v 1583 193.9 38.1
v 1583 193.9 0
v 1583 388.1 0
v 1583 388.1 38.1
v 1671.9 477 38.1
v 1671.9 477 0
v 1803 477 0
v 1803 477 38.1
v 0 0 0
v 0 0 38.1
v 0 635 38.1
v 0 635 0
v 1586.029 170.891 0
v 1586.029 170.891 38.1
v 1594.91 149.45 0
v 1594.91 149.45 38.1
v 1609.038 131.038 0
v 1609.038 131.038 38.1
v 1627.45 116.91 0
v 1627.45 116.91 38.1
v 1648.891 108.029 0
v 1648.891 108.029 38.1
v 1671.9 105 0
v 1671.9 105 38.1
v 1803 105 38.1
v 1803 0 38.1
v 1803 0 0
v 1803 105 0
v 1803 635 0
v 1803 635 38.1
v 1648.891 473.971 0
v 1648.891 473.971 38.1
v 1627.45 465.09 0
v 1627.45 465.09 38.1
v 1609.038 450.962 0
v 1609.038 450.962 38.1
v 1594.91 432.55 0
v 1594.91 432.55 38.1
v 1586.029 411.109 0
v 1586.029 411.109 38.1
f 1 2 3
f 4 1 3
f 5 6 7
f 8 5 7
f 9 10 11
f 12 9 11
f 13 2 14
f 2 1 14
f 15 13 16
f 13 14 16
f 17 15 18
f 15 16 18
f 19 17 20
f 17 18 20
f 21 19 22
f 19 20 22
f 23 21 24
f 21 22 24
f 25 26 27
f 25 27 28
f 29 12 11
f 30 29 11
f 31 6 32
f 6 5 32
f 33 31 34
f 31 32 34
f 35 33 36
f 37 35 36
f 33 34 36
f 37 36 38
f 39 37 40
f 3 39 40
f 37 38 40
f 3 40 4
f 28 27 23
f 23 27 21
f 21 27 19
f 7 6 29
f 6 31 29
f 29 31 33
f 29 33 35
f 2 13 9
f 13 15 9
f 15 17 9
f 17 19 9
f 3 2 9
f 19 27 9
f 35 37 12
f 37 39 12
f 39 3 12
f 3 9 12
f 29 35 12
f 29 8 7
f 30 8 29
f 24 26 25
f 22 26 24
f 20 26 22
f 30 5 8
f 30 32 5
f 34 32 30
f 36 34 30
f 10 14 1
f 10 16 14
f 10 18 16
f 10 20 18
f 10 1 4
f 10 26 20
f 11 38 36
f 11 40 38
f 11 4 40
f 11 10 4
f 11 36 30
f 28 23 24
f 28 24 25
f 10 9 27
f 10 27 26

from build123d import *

# Parameters (mm, degrees)
F0_W     = 635
F0_H     = 38.1
F1_DEPTH = 1803
F2_W     = 220
F2_H     = 372
F3_DEPTH = 38.101
F4_R     = 88.9


with BuildPart() as f1:
    # F0 (on Right) → F1 (new body)
    with BuildSketch(Plane.YZ):
        with Locations((317.5, 19.05)):
            Rectangle(F0_W, F0_H)
    extrude(amount=F1_DEPTH)

    # F2 (on Top) → F3 (cut, through all)
    with BuildSketch(Plane.XY):
        with Locations((1693, 291)):
            Rectangle(F2_W, F2_H)
    extrude(amount=F3_DEPTH, mode=Mode.SUBTRACT)

    # F4
    f4_edges = [f1.edges().sort_by_distance(p)[0] for p in [
        (1583, 477, 19.05),
        (1583, 105, 19.05),
    ]]
    fillet(f4_edges, radius=F4_R)


solid = f1.part
